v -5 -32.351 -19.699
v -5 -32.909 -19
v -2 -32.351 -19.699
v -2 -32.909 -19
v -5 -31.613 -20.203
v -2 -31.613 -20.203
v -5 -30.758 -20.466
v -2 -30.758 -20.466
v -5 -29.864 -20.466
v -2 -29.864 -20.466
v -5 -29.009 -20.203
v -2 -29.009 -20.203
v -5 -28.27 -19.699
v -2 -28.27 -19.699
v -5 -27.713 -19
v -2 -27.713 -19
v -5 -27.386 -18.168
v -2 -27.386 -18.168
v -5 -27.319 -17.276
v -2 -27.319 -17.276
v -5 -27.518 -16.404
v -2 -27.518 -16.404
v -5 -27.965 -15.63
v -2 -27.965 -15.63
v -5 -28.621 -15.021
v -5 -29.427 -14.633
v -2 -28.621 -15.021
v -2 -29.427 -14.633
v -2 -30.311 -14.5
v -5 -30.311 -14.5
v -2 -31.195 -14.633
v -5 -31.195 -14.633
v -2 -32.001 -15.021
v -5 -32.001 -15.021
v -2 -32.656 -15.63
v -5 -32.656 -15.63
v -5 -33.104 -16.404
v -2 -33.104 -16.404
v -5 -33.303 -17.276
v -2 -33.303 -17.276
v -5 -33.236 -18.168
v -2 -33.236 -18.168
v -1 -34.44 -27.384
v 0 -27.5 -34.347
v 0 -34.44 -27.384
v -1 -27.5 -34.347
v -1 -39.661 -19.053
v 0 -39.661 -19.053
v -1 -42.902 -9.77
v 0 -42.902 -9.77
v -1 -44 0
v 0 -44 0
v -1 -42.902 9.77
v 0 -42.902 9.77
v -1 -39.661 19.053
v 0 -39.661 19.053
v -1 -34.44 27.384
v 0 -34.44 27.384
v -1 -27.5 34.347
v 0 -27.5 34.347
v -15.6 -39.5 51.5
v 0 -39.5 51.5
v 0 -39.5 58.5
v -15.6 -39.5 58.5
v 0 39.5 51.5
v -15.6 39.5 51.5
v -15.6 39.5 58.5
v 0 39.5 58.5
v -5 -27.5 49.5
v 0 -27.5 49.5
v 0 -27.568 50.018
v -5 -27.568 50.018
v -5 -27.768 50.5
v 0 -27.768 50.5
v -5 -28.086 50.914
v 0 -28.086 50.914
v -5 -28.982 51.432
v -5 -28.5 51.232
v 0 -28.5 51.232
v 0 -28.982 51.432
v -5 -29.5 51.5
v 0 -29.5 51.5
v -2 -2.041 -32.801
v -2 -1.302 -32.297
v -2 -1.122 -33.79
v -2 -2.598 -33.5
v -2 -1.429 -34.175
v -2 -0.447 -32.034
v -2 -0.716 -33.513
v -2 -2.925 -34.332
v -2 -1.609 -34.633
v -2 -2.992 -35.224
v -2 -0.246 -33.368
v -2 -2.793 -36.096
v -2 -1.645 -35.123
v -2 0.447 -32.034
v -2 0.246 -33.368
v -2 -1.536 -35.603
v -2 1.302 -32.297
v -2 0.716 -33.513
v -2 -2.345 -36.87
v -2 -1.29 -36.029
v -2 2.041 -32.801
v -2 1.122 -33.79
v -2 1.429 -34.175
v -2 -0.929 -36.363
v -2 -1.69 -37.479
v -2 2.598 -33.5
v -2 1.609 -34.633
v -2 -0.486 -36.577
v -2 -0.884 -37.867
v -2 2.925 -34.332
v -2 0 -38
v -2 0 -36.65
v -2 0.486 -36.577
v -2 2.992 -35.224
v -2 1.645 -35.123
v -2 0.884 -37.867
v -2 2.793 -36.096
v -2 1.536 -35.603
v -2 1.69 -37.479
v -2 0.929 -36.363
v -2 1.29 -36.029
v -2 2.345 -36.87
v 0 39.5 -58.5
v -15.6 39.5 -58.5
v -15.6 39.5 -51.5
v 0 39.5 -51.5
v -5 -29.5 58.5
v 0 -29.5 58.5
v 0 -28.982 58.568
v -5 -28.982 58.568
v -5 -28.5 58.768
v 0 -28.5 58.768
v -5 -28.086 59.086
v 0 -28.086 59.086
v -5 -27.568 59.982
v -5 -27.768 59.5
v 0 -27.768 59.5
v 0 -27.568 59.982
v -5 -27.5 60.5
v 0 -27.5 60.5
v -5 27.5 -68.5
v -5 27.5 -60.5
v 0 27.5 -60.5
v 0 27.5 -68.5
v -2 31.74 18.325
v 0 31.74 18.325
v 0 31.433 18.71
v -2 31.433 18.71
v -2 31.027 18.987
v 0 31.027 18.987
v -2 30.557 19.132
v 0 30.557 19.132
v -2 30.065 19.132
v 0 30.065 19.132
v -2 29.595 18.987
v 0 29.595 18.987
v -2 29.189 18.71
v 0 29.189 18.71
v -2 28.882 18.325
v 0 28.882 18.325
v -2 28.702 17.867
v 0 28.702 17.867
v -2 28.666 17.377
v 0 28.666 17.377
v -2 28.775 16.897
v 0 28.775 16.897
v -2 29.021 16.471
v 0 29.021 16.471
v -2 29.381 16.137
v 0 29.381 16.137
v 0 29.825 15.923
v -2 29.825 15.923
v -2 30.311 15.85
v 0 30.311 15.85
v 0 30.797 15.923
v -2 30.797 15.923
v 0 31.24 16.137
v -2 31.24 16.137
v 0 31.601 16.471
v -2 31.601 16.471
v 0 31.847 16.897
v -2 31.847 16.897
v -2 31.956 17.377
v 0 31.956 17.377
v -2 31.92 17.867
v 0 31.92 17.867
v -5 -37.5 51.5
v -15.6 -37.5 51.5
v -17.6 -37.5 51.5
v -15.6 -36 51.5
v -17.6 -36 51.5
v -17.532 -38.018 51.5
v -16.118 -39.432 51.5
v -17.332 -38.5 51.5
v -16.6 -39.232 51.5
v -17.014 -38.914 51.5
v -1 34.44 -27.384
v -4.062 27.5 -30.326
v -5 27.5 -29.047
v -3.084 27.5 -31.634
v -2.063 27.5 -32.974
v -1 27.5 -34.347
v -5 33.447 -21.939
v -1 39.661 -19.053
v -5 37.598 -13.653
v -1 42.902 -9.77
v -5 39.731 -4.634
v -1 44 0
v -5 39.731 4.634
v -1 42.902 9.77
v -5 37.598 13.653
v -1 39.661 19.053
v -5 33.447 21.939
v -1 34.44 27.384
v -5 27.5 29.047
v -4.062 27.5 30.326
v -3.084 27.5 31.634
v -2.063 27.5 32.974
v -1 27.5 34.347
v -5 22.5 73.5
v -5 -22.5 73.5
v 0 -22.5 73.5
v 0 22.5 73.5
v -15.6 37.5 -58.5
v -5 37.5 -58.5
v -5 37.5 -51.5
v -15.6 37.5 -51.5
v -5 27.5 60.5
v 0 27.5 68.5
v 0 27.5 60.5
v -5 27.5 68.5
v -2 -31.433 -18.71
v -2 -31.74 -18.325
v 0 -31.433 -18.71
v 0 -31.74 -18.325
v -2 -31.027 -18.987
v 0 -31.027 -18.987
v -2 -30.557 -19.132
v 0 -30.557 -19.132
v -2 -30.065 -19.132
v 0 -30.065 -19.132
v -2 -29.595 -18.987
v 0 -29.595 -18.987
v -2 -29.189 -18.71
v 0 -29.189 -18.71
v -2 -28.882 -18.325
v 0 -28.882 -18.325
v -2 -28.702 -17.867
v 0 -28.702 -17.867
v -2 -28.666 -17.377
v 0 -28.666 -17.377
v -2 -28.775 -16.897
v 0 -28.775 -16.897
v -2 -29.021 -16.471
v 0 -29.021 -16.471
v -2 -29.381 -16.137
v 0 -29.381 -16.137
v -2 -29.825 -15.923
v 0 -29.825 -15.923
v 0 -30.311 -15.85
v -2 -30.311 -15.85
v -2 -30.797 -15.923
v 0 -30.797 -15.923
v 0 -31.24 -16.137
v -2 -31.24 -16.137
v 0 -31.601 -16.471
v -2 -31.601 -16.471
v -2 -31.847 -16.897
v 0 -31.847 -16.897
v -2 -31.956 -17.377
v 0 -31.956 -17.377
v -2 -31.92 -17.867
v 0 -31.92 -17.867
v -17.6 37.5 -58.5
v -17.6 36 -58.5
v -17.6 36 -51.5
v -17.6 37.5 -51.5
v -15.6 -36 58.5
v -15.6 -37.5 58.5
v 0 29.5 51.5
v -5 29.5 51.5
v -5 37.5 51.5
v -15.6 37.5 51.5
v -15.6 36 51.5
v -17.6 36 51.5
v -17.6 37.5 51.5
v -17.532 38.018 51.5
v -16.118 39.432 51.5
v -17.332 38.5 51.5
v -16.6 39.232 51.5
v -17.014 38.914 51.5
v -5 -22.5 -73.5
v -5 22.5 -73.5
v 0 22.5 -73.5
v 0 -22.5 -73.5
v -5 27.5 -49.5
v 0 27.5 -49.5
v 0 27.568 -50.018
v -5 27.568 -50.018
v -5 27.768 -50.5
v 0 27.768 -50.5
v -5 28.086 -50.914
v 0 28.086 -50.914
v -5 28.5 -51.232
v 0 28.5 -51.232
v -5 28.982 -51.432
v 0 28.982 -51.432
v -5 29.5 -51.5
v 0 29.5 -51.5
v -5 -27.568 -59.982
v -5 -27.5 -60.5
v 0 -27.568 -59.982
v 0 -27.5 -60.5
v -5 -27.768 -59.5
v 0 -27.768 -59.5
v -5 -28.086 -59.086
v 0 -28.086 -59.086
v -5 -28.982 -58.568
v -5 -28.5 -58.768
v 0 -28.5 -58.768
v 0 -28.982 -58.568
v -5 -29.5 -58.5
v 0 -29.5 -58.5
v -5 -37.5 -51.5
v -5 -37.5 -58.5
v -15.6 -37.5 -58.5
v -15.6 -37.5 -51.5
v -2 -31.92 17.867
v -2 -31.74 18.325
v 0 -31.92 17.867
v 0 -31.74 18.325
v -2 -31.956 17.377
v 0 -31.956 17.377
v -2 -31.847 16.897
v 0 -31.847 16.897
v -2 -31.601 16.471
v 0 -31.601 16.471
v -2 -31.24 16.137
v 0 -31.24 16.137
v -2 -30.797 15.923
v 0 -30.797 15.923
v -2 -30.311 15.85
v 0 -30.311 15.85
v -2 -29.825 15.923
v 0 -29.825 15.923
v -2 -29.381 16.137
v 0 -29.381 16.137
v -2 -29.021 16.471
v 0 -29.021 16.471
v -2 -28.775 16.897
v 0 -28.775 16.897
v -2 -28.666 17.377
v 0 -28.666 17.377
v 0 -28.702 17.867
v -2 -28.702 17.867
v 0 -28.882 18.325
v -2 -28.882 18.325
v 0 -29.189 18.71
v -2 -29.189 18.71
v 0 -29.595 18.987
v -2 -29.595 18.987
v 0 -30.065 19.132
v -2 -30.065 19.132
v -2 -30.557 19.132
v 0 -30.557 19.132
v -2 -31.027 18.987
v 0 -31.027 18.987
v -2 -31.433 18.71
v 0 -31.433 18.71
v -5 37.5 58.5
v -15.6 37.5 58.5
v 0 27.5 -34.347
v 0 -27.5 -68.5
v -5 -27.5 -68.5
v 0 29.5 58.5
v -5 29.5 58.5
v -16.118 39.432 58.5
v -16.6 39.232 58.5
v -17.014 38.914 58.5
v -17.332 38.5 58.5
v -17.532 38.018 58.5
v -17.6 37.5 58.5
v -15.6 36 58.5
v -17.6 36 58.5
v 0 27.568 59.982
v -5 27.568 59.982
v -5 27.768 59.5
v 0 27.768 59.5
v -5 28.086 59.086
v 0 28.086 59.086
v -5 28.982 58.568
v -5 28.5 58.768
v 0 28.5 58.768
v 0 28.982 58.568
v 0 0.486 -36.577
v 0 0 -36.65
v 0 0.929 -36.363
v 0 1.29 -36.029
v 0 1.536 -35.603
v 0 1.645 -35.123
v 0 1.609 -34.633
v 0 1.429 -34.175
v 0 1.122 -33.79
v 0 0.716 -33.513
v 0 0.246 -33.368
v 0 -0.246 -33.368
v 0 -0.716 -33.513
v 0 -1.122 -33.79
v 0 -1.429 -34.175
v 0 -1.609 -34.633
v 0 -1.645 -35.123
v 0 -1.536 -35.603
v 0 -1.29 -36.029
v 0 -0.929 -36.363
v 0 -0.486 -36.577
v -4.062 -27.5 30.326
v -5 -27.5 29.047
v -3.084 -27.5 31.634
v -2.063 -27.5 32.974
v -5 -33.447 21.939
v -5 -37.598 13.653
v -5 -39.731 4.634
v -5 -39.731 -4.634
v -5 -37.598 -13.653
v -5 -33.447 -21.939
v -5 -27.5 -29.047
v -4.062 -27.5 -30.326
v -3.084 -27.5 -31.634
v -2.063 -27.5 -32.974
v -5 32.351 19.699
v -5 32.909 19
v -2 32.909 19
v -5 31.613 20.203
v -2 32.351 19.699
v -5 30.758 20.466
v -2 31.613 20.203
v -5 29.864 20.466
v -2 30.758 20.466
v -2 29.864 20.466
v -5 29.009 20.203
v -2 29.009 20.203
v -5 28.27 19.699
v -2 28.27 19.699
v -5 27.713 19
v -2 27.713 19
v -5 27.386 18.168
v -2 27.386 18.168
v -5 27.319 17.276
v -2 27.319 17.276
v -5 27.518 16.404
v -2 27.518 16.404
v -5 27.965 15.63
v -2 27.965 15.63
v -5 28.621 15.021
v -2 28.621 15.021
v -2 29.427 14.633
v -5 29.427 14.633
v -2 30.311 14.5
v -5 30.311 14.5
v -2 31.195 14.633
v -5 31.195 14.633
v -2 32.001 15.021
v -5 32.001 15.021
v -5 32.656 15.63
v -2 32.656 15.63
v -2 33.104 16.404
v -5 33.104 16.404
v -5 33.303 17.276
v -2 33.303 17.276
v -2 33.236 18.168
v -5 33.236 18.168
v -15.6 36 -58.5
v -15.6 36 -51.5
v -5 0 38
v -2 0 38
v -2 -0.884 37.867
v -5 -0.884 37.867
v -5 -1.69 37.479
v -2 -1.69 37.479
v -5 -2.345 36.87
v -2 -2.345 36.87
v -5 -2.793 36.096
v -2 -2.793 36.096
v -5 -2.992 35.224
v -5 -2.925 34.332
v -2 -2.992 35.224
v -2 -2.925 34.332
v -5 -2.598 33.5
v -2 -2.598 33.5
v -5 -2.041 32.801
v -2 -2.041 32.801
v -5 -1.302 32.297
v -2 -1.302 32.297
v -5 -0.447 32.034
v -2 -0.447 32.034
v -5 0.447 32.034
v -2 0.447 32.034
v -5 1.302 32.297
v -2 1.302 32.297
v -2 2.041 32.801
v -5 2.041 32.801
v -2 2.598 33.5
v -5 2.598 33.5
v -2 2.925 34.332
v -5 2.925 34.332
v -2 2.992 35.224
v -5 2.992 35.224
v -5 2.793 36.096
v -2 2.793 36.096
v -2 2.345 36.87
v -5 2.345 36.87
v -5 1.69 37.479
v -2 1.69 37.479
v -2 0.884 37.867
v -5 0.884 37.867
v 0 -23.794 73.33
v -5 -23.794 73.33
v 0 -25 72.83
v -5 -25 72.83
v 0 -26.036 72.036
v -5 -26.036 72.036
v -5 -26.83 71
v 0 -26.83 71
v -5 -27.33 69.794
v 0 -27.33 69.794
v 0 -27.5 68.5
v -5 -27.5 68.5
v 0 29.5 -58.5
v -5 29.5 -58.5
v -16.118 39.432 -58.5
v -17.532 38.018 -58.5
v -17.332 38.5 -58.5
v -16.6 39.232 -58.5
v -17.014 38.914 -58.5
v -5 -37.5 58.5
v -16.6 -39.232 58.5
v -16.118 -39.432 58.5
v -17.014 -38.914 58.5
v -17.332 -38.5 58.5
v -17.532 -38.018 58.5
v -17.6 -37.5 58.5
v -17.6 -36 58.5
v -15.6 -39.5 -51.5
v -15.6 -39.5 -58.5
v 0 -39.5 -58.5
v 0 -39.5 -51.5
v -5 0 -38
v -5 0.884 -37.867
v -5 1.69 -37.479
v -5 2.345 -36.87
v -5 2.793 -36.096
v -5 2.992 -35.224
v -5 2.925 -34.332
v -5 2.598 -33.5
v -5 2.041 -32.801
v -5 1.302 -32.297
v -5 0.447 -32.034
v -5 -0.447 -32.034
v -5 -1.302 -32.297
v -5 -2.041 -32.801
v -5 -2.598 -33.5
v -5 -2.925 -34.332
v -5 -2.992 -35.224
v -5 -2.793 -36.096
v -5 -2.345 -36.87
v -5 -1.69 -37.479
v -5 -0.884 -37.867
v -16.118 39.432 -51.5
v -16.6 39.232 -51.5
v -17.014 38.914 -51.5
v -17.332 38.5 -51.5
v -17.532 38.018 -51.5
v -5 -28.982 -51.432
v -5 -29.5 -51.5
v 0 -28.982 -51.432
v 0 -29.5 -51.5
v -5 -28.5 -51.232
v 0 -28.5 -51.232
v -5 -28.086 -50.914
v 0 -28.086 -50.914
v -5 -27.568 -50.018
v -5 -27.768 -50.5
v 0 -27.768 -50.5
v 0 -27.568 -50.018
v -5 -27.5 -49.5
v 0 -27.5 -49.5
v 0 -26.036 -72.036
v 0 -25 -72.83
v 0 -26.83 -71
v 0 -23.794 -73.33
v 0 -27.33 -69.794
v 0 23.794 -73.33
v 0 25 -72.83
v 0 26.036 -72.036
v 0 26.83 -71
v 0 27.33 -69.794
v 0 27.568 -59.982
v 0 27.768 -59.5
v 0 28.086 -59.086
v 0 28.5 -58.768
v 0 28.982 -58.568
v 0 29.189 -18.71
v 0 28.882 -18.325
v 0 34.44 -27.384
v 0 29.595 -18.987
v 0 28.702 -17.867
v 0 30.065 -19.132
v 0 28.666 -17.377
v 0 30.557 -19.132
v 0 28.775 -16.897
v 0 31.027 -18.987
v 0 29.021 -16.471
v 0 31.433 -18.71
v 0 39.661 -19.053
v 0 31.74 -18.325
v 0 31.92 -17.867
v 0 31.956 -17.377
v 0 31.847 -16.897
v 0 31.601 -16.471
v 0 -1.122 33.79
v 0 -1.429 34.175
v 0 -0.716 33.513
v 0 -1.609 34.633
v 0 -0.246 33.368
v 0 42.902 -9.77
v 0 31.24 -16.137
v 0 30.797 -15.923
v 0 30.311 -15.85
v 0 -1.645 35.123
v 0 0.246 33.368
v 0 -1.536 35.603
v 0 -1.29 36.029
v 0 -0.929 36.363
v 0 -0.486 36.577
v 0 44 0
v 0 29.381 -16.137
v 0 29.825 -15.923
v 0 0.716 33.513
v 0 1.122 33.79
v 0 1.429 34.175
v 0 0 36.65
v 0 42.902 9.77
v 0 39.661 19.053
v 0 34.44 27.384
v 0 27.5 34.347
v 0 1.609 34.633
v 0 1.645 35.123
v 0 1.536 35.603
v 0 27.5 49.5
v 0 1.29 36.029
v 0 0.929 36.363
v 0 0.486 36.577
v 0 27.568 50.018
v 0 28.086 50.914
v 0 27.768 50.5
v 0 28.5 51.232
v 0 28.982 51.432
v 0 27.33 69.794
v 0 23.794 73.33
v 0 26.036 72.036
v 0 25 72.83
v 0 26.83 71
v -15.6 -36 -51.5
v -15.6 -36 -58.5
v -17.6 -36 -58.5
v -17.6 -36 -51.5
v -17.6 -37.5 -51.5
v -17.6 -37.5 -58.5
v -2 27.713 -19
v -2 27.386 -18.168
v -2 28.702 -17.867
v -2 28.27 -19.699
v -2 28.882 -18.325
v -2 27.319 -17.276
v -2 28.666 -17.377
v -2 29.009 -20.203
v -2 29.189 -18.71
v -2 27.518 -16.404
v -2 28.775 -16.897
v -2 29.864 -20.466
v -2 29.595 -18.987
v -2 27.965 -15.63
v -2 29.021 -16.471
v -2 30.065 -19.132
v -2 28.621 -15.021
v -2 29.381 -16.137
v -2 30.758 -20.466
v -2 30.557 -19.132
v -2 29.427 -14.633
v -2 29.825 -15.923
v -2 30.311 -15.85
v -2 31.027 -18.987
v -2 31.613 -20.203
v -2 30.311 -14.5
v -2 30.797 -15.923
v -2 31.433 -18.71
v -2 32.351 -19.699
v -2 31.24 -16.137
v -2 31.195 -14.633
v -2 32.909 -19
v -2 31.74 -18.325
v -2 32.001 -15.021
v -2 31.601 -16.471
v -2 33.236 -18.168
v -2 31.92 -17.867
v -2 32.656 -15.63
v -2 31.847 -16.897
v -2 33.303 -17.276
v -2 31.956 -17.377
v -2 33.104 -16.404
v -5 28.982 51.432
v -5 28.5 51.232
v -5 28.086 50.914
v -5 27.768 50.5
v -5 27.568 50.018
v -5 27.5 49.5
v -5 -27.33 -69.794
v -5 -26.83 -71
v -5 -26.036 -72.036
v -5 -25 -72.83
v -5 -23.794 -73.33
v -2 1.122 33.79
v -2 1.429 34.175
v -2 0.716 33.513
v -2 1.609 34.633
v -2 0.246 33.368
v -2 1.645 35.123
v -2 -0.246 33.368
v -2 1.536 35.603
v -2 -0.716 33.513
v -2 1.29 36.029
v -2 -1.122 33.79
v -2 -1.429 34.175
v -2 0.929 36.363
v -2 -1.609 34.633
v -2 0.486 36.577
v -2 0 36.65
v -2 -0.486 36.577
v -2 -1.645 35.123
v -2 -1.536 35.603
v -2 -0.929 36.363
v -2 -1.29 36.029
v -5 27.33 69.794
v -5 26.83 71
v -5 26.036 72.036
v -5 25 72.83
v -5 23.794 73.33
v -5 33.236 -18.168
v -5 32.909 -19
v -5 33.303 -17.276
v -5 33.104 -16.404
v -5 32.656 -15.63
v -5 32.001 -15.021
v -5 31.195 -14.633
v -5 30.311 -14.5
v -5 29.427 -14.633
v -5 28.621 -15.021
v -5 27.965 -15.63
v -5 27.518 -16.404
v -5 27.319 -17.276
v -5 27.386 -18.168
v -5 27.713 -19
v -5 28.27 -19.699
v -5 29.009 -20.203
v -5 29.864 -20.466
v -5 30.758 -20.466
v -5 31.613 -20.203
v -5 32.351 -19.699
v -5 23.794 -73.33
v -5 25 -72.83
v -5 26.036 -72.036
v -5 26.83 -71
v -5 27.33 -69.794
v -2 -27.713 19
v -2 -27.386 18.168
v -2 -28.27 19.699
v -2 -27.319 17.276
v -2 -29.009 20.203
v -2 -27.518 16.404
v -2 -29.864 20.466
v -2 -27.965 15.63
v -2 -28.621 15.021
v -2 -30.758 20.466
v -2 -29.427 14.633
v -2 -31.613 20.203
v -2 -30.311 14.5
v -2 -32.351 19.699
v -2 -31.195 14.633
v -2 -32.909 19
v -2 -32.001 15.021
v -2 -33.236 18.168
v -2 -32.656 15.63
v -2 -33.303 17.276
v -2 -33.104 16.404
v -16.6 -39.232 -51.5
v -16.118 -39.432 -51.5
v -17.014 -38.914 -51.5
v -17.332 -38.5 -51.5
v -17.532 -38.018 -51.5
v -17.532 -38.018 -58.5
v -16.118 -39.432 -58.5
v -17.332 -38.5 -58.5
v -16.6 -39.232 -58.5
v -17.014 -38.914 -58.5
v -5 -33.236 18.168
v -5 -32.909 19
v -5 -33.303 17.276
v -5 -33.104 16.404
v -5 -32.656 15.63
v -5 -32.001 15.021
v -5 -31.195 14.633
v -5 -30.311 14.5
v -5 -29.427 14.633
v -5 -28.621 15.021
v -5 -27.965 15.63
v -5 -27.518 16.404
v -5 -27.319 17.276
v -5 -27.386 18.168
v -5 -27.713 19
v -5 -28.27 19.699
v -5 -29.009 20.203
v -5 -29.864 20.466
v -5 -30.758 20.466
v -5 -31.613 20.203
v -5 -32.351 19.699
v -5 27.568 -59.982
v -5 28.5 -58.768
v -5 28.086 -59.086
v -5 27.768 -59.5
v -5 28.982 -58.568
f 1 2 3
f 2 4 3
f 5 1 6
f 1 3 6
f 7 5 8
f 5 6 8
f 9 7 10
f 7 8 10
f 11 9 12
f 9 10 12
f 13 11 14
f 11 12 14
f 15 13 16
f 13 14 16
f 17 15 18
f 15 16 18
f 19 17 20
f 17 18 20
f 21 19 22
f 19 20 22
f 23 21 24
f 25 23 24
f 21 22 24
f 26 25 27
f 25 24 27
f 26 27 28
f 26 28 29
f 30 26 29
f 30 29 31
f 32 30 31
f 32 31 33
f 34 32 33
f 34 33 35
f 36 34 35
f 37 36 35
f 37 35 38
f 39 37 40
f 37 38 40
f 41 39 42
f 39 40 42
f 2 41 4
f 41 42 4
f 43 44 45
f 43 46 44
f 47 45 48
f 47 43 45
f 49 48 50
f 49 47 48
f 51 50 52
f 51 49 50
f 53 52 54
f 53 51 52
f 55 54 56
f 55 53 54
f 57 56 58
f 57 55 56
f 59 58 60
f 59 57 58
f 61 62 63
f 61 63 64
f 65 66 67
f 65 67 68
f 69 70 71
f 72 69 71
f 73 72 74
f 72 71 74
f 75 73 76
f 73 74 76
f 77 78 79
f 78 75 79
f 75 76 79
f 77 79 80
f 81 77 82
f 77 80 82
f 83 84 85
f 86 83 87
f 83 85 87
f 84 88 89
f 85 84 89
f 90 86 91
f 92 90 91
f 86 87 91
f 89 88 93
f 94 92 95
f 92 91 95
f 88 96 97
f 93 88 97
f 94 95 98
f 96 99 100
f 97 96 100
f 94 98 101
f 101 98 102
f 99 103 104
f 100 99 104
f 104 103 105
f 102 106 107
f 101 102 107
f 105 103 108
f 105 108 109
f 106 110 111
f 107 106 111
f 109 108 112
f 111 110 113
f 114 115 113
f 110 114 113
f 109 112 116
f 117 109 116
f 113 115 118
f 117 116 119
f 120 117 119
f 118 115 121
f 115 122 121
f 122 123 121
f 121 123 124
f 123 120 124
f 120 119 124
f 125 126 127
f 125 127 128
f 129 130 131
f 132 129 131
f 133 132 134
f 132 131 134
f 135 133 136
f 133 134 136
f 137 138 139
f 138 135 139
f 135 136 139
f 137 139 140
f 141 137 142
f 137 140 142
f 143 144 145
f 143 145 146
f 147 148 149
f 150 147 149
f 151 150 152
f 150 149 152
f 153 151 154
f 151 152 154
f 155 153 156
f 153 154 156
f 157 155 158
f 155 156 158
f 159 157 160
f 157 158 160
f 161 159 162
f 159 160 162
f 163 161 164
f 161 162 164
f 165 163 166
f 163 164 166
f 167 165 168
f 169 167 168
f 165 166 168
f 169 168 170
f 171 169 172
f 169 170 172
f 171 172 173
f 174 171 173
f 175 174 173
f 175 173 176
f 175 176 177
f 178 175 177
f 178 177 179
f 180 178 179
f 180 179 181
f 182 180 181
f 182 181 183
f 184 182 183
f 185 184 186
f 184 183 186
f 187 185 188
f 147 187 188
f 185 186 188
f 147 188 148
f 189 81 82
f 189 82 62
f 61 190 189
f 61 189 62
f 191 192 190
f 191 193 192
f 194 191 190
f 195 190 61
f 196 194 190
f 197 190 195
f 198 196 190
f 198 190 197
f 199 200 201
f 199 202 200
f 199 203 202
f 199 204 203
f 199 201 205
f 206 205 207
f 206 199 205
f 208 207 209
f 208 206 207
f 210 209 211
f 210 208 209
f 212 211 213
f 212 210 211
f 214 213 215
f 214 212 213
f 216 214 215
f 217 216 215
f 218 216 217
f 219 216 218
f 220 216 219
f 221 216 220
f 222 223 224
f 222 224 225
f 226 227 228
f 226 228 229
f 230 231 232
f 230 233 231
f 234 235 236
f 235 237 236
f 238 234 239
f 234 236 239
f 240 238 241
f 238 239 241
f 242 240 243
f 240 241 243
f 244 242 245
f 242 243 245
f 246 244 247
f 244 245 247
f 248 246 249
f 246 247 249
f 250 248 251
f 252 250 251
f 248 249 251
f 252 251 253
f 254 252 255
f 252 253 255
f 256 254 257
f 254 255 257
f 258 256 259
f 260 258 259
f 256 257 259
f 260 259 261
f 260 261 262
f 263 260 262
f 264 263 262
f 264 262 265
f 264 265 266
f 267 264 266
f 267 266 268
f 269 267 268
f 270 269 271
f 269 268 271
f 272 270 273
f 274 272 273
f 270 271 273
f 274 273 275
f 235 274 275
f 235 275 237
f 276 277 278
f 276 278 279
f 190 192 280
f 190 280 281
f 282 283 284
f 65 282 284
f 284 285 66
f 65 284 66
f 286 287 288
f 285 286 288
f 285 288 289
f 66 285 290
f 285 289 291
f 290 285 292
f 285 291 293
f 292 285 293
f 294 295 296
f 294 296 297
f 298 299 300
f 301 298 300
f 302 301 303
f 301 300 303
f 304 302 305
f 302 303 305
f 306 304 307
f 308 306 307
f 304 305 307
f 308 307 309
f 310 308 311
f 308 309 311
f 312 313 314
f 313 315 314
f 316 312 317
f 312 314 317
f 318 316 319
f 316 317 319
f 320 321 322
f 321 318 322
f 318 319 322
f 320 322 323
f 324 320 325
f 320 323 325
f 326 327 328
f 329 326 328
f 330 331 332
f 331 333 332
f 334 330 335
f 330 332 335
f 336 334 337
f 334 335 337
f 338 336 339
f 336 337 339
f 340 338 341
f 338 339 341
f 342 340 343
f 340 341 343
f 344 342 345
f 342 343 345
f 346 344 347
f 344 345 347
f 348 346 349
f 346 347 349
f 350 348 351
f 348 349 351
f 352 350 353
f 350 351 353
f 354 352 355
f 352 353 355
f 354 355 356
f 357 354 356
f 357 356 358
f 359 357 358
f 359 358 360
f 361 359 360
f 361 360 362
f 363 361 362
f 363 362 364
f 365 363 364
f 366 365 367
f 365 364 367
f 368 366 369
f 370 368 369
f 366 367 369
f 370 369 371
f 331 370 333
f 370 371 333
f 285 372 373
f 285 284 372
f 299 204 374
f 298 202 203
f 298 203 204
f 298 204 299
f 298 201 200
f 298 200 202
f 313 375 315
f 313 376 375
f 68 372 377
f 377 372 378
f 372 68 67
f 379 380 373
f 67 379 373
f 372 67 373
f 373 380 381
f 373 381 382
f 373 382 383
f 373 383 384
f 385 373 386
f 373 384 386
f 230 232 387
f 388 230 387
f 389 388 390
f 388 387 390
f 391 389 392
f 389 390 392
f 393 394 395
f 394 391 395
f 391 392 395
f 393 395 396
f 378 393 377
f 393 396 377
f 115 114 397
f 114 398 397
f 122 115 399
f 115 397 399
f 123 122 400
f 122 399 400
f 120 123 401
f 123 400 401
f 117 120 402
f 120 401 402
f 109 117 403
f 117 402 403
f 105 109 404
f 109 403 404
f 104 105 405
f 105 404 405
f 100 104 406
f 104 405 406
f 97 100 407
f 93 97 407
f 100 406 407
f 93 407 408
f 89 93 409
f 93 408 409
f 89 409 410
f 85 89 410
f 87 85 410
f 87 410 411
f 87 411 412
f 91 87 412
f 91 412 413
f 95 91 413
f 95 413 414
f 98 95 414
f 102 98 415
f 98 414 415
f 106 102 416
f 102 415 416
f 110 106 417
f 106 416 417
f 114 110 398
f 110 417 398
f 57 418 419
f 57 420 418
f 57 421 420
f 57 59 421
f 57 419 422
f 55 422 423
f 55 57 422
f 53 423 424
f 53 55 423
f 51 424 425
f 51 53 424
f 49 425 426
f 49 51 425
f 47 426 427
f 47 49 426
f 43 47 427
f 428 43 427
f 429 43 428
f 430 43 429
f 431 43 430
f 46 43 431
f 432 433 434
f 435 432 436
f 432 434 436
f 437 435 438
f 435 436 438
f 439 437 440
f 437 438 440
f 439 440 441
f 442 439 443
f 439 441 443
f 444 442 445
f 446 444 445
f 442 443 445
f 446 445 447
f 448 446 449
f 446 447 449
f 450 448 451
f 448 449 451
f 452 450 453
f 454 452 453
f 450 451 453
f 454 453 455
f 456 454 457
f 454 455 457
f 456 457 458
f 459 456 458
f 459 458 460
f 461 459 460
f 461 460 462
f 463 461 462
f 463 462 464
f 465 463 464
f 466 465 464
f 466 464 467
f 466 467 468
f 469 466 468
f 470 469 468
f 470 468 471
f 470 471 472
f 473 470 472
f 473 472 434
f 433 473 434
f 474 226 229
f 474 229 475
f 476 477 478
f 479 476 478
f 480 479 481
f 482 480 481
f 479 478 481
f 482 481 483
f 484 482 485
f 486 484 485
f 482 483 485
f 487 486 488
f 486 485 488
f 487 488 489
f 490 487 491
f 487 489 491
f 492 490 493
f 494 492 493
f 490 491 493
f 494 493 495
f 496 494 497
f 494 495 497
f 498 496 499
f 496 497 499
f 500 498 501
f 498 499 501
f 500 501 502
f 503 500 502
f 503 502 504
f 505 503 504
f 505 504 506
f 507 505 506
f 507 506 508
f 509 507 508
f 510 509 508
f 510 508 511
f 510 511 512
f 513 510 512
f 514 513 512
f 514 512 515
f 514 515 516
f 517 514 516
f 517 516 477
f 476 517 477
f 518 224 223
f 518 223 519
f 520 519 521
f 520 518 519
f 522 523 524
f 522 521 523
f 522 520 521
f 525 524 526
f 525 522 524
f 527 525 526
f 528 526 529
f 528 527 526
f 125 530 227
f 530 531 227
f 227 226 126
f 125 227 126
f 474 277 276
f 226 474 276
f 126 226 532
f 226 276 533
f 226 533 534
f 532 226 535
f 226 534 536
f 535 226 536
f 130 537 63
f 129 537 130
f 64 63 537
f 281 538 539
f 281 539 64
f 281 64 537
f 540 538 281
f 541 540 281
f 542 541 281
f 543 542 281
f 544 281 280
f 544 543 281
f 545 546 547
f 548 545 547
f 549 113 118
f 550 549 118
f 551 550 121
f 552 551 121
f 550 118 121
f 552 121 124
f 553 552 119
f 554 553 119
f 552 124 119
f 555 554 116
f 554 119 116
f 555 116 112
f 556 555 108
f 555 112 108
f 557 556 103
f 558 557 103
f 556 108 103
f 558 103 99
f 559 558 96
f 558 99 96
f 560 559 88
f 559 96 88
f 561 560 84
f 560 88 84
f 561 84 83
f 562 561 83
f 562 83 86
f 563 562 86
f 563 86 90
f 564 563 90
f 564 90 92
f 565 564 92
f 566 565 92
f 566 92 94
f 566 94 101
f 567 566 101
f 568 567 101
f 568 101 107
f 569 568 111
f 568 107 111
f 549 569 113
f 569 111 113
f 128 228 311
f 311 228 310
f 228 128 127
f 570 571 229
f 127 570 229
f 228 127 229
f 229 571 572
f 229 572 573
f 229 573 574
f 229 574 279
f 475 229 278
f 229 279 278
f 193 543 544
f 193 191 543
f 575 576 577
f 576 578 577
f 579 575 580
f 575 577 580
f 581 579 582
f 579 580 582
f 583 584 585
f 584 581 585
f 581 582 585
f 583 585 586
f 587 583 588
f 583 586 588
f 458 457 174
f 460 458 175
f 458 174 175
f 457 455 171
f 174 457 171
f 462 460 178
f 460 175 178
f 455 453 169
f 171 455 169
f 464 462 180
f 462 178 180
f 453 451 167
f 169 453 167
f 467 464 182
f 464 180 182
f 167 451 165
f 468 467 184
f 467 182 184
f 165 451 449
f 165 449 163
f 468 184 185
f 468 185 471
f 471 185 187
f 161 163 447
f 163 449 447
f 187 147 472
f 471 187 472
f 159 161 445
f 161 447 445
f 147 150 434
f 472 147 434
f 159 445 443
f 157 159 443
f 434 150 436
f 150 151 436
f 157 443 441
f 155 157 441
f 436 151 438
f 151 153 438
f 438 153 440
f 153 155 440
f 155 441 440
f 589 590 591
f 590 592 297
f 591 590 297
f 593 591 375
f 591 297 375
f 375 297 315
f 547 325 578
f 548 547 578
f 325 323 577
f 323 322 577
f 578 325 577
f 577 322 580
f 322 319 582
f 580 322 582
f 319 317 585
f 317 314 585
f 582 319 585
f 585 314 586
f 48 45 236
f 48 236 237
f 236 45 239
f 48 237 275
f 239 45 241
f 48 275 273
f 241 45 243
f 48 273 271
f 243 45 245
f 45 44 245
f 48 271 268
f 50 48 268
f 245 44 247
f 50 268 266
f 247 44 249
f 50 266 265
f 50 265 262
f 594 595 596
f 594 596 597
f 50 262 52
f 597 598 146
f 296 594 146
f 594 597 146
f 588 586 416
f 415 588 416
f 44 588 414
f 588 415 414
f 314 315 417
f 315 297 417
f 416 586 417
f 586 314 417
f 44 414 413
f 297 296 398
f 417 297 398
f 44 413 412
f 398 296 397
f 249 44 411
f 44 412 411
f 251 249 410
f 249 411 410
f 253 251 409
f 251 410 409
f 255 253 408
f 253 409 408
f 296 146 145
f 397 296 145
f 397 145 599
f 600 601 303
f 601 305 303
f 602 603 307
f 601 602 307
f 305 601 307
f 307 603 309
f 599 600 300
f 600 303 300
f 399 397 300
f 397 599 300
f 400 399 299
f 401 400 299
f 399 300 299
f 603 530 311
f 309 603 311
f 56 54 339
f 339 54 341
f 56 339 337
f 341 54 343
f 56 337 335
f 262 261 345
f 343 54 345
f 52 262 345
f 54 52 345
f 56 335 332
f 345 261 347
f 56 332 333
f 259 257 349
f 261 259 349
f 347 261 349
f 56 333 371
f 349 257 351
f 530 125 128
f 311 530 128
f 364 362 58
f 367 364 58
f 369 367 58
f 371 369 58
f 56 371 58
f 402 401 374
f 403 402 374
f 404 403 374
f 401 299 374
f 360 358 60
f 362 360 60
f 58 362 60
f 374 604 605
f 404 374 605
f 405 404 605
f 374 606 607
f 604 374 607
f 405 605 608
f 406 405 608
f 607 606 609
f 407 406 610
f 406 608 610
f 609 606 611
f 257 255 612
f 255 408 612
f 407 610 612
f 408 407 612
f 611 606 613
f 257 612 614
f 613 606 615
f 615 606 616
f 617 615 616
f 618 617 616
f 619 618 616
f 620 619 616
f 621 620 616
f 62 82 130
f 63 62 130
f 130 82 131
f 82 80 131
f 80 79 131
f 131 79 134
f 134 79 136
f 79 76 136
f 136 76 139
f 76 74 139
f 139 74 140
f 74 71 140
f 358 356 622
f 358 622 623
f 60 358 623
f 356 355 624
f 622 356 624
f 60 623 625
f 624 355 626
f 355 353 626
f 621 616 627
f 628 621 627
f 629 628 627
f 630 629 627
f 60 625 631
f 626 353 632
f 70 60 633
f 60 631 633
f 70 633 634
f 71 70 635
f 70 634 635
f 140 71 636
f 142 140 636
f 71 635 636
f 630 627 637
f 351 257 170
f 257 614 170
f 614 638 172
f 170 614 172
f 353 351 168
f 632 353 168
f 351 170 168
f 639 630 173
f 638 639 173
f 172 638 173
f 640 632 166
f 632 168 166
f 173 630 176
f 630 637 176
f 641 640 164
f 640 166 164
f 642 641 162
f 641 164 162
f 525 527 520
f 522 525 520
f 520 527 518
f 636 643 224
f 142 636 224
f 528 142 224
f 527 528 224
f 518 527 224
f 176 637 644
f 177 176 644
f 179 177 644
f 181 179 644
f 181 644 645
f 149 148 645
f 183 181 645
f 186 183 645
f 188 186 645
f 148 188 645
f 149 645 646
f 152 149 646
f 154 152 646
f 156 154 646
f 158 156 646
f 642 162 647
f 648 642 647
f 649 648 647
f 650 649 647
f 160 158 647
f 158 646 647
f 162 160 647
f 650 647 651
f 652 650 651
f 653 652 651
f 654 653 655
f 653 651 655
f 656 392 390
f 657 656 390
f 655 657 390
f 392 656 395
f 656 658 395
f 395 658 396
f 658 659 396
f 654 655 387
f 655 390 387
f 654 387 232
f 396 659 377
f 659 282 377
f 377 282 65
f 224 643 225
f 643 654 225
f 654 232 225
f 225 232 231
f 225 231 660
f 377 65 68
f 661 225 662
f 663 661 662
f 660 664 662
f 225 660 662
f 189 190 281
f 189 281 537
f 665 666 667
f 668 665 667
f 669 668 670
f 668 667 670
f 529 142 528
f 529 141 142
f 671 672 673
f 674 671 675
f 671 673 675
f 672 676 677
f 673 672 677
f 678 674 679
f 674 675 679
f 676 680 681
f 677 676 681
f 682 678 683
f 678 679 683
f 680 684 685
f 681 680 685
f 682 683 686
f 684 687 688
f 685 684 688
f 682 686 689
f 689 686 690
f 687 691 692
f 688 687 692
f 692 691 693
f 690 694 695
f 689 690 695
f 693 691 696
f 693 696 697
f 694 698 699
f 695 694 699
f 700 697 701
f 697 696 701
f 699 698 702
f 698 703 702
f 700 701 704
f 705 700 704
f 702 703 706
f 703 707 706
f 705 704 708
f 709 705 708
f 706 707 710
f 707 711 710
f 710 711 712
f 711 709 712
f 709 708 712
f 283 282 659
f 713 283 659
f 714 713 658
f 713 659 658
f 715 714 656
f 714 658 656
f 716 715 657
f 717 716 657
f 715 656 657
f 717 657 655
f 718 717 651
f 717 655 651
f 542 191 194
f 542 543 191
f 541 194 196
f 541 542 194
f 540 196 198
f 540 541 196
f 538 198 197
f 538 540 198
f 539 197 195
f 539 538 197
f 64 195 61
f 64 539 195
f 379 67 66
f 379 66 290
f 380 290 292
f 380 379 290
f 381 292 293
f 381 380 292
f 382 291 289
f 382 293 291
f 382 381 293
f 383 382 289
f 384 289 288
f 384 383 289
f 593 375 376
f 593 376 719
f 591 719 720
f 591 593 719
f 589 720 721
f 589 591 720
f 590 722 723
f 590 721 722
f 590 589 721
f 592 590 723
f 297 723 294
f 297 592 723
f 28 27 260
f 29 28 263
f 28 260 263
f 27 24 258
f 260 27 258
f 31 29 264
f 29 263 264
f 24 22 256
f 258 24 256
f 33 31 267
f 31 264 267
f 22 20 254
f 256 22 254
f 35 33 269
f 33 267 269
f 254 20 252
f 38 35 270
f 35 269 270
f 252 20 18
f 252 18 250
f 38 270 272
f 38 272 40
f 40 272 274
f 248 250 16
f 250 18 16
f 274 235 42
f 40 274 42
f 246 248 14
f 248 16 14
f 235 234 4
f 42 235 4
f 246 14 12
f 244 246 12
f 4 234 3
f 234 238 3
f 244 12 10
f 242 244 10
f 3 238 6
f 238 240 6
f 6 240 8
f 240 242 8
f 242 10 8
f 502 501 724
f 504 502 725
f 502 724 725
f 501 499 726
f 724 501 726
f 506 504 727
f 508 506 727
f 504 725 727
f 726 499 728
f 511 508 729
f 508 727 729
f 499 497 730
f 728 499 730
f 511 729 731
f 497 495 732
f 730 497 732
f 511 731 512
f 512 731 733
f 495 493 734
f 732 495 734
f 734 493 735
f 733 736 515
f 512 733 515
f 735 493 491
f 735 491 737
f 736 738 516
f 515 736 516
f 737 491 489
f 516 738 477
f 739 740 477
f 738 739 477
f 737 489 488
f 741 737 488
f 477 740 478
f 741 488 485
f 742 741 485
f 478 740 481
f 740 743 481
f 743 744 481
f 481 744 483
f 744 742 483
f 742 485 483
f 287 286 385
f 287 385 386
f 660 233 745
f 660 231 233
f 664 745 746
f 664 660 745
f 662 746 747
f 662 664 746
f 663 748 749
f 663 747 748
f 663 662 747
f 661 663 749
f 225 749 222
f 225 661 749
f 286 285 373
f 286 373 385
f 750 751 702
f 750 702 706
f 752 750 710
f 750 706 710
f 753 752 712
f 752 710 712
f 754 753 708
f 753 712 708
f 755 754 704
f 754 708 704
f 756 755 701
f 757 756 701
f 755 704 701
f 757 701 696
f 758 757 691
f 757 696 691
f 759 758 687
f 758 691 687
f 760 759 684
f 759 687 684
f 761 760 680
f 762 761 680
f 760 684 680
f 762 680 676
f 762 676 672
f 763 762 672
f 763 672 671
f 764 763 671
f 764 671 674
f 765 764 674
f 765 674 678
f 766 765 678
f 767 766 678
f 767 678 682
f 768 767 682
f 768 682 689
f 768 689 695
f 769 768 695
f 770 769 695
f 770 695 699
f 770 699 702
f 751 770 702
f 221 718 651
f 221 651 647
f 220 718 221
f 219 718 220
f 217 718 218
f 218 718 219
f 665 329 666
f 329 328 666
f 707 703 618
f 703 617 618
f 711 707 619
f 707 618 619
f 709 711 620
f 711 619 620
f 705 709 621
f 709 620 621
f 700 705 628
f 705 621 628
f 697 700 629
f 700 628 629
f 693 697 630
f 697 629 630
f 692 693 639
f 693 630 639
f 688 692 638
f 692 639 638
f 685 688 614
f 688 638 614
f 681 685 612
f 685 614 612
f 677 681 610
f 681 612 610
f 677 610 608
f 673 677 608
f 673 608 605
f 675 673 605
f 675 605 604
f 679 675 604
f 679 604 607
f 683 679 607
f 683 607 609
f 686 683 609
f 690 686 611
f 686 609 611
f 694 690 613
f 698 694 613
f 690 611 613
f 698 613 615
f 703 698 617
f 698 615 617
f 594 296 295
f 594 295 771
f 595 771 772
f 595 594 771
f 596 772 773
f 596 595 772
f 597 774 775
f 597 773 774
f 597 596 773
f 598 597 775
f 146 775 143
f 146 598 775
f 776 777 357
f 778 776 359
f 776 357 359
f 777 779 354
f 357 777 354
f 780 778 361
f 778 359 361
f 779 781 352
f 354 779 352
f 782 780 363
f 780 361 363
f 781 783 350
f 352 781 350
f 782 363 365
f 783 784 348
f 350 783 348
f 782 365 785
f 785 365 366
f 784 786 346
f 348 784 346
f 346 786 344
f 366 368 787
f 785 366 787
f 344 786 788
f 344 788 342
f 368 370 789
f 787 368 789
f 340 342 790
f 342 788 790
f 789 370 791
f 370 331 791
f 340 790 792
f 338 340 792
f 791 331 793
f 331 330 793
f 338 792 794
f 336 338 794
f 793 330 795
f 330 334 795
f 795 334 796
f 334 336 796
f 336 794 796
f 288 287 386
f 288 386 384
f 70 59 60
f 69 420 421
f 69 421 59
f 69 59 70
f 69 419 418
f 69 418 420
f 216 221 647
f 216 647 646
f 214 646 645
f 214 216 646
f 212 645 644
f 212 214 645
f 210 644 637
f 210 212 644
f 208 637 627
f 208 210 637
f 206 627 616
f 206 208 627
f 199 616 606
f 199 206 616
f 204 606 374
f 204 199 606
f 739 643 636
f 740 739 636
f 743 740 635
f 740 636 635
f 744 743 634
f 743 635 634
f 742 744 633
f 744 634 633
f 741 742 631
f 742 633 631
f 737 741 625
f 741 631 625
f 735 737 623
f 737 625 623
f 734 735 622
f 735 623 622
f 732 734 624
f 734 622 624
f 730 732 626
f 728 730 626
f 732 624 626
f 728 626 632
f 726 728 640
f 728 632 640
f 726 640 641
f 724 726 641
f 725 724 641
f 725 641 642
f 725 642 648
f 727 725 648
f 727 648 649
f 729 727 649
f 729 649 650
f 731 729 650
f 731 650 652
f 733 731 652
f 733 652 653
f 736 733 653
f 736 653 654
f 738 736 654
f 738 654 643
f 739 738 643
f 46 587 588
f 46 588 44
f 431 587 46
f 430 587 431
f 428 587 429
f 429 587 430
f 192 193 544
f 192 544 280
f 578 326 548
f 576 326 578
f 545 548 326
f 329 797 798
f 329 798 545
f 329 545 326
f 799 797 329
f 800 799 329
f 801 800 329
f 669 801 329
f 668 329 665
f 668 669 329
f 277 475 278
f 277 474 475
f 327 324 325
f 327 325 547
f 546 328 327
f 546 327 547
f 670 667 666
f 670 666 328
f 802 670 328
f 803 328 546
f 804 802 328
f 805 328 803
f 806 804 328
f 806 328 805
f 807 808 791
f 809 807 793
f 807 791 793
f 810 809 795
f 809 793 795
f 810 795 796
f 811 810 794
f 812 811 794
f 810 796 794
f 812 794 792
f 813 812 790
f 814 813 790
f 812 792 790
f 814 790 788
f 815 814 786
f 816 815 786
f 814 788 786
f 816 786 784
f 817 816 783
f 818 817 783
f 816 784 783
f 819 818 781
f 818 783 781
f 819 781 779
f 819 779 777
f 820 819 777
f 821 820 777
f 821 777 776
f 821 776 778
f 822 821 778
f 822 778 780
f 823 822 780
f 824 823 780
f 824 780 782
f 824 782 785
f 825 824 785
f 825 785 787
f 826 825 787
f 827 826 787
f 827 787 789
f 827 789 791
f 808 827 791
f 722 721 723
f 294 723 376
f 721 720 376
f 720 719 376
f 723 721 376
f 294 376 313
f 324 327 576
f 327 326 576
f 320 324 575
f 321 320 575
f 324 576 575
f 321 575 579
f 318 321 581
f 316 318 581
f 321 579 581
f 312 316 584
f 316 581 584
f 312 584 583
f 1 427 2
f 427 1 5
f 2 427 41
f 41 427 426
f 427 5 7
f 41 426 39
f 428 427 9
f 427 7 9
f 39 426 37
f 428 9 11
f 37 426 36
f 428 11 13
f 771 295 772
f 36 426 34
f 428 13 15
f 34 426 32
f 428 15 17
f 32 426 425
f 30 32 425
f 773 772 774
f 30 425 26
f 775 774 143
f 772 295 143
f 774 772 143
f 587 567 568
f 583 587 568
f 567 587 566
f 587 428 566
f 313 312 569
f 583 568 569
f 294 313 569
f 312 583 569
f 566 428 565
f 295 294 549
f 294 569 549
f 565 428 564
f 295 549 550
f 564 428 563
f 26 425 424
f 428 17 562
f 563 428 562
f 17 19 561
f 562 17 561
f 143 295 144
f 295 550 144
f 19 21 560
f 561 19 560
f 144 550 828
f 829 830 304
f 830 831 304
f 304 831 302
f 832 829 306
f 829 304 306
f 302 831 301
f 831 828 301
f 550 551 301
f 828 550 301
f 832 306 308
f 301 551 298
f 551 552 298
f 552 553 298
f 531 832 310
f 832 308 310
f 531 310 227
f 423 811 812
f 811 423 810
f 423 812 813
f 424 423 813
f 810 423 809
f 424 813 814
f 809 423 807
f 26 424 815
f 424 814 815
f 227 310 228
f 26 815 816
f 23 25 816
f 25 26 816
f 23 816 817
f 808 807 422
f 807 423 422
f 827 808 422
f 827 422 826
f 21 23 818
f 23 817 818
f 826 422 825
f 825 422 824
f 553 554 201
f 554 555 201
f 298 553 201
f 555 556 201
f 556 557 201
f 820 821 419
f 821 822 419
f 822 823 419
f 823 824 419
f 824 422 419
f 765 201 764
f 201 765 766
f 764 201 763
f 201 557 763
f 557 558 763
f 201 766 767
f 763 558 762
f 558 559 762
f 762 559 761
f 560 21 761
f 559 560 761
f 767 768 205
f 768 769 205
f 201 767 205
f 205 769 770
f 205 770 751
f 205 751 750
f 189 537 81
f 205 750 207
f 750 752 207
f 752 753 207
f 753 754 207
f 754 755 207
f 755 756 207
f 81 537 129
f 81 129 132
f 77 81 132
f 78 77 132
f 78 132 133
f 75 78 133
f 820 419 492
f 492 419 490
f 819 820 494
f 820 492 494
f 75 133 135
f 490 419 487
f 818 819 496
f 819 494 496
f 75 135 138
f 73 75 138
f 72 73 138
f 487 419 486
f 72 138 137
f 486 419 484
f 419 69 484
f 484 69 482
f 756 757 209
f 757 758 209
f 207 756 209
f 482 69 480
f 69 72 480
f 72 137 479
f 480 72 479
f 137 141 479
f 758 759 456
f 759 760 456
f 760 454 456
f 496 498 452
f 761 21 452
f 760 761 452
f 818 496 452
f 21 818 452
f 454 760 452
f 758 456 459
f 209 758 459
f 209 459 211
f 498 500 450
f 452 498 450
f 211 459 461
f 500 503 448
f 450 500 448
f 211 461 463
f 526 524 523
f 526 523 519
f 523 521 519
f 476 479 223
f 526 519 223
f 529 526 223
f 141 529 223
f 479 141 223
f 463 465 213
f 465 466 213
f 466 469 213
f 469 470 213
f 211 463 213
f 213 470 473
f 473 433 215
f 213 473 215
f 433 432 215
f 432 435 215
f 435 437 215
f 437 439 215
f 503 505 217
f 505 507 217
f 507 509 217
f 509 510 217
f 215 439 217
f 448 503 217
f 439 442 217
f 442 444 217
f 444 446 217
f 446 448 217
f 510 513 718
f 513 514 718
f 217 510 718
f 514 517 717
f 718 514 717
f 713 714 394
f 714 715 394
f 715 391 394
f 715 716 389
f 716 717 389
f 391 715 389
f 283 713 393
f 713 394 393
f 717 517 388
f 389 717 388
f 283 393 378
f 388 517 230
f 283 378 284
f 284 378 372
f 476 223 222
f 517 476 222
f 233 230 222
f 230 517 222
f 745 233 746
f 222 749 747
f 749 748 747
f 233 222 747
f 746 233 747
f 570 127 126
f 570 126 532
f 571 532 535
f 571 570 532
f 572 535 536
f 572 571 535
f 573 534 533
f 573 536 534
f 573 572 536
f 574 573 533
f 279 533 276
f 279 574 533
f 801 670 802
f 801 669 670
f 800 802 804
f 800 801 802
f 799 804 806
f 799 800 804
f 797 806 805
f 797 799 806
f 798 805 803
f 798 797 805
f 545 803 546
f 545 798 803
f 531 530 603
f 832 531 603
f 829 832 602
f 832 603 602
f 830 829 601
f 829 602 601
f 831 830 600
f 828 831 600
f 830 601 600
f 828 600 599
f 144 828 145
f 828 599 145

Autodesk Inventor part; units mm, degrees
ref_plane "YZ Plane" through (0, 0, 0) normal (1, 0, 0) x (0, 1, 0)
ref_plane "XZ Plane" through (0, 0, 0) normal (0, 1, 0) x (-1, 0, 0)
sketch "Sketch1" plane through (0, 0, 0) normal (0, 0, 1) x (1, 0, 0)
  line L0 (0, 0) -> (0, 44)
  line L1 (-5, 0) -> (0, 0)
  line L2 (0, 44) -> (-1, 44)
  line L3 (-1, 44) -> (-5, 40)
  line L4 (-5, 40) -> (-5, 0)
  dimension "d0" = 44
  dimension "d3" = 1
  dimension "d19" = 5
  dimension "d20" = 45
revolve "Revolution1" add sketch "Sketch1" angle 360 about axis through (-5, 0, 0) along (1, 0, 0)
sketch "Sketch2" plane through (0, 0, 0) normal (1, 0, 0) x (0, 0, -1)
  line L0 (0, 0) -> (35, 0) construction
  circle A0 centre (35, 0) radius 1.65
  dimension "d7" = 3.3
  dimension "d8" = 35
extrude "Extrusion1" cut sketch "Sketch2" against normal through all
ref_plane "Work Plane1" through (-2, 0, 0) normal (1, 0, 0) x (0, 0, -1)
sketch "Sketch3" plane through (-2, 0, 0) normal (1, 0, 0) x (0, 0, -1)
  circle A0 centre (35, 0) radius 3
  circle A1 centre (35, 0) radius 1.65 projected
  point P0 (0, 0)
  dimension "d12" = 6
extrude "Extrusion2" cut sketch "Sketch3" against normal through all contours A0 | A1
pattern_circular "Circular Pattern1" count 6 over 360 about axis through (-0.5, 0, 0) along (1, 0, 0) of "Extrusion2", "Extrusion1"
sketch "Sketch4" plane through (-5, 0, 0) normal (-1, 0, 0) x (0, 0, 1)
  line L0 (73.5, 27.5) -> (-73.5, 27.5)
  line L1 (-73.5, 27.5) -> (-73.5, -27.5)
  line L2 (-73.5, -27.5) -> (73.5, -27.5)
  line L3 (73.5, -27.5) -> (73.5, 27.5)
  line L4 (73.5, 27.5) -> (-73.5, -27.5) construction
  line L5 (-73.5, 27.5) -> (73.5, -27.5) construction
  line L6 (58.5, -27.5) -> (51.5, -27.5)
  line L7 (51.5, -27.5) -> (51.5, -37.5)
  line L8 (51.5, -37.5) -> (58.5, -37.5)
  line L9 (58.5, -37.5) -> (58.5, -27.5)
  line L10 (-51.5, -27.5) -> (-58.5, -27.5)
  line L11 (-58.5, -27.5) -> (-58.5, -37.5)
  line L12 (-58.5, -37.5) -> (-51.5, -37.5)
  line L13 (-51.5, -37.5) -> (-51.5, -27.5)
  line L14 (-51.5, 27.5) -> (-58.5, 27.5)
  line L15 (-58.5, 27.5) -> (-58.5, 37.5)
  line L16 (-58.5, 37.5) -> (-51.5, 37.5)
  line L17 (-51.5, 37.5) -> (-51.5, 27.5)
  line L18 (58.5, 27.5) -> (51.5, 27.5)
  line L19 (51.5, 27.5) -> (51.5, 37.5)
  line L20 (51.5, 37.5) -> (58.5, 37.5)
  line L21 (58.5, 37.5) -> (58.5, 27.5)
  circle A0 centre (0, 0) radius 40 projected
  point P0 (-29.0474, -27.5)
  point P1 (-29.0474, 27.5)
  point P2 (29.0474, 27.5)
  point P3 (29.0474, -27.5)
  dimension "d21" = 147
  dimension "d22" = 55
  dimension "d23" = 15
  dimension "d24" = 7
  dimension "d26" = 15
  dimension "d29" = 75
extrude "Extrusion3" add sketch "Sketch4" against normal up to surface (5 mm away) contours L3 L2 A0 L0 | L0 L19 L20 L21 | L9 L8 L7 L2 | A0 L2 L1 L0 | L0 L15 L16 L17 | L13 L12 L11 L2
sketch "Sketch5" plane through (-5, 27.5, -58.5) normal (0, 0, -1) x (-1, 0, 0)
  line L0 (-5, -65) -> (10.6, -65)
  line L1 (12.6, -65) -> (12.6, -67)
  line L2 (12.6, -67) -> (-5, -67)
  line L3 (-5, -67) -> (-5, -65)
  line L4 (-5, 10) -> (10.6, 10)
  line L5 (12.6, 10) -> (12.6, 12)
  line L6 (12.6, 12) -> (-5, 12)
  line L7 (-5, 12) -> (-5, 10)
  line L8 (10.6, 10) -> (10.6, 8.5)
  line L9 (10.6, 8.5) -> (12.6, 8.5)
  line L10 (12.6, 8.5) -> (12.6, 10)
  line L11 (10.6, -65) -> (10.6, -63.5)
  line L12 (10.6, -63.5) -> (12.6, -63.5)
  line L13 (12.6, -63.5) -> (12.6, -65)
  line L14 (0, 10) -> (0, 0) projected
  point P0 (-5, -27.5)
  dimension "d30" = 2
  dimension "d31" = 10.6
  dimension "d32" = 2
  dimension "d33" = 1.5
extrude "Extrusion4" add sketch "Sketch5" against normal up to surface (7 mm away)
sketch "Sketch6" plane through (-5, -37.5, 51.5) normal (0, 0, -1) x (-1, 0, 0)
  line L0 (-5, 77) -> (-5, 65) projected
  line L1 (0, 65) -> (-5, 65) projected
  line L2 (0, 75) -> (0, 65) projected
  line L3 (0, 75) -> (10.6, 75) projected
  line L4 (10.6, 75) -> (10.6, 73.5) projected
  line L5 (10.6, 73.5) -> (12.6, 73.5) projected
  line L6 (12.6, 73.5) -> (12.6, 77) projected
  line L7 (12.6, 77) -> (-5, 77) projected
  line L8 (-5, 10) -> (-5, -2) projected
  line L9 (-5, -2) -> (12.6, -2) projected
  line L10 (12.6, -2) -> (12.6, 1.5) projected
  line L11 (12.6, 1.5) -> (10.6, 1.5) projected
  line L12 (10.6, 1.5) -> (10.6, 0) projected
  line L13 (10.6, 0) -> (0, 0) projected
  line L14 (0, 10) -> (0, 0) projected
  line L15 (0, 10) -> (-5, 10) projected
  point P0 (-5, 37.5)
extrude "Extrusion5" add sketch "Sketch6" against normal up to surface (7 mm away)
fillet "Fillet1" radius 5 4 edges at (-2.5, -27.5, -73.5) (-2.5, 27.5, -73.5) (-2.5, -27.5, 73.5) (-2.5, 27.5, 73.5)
fillet "Fillet2" radius 2 4 edges at (-17.6, 39.5, 55) (-17.6, 39.5, -55) (-17.6, -39.5, 55) (-17.6, -39.5, -55)
fillet "Fillet3" radius 2 8 edges at (-2.5, 27.5, -58.5) (-2.5, 27.5, 51.5) (-2.5, -27.5, 51.5) (-2.5, -27.5, -58.5) (-2.5, -27.5, -51.5) (-2.5, -27.5, 58.5) (-2.5, 27.5, 58.5) (-2.5, 27.5, -51.5)
properties part number "PhoneHOldER"
